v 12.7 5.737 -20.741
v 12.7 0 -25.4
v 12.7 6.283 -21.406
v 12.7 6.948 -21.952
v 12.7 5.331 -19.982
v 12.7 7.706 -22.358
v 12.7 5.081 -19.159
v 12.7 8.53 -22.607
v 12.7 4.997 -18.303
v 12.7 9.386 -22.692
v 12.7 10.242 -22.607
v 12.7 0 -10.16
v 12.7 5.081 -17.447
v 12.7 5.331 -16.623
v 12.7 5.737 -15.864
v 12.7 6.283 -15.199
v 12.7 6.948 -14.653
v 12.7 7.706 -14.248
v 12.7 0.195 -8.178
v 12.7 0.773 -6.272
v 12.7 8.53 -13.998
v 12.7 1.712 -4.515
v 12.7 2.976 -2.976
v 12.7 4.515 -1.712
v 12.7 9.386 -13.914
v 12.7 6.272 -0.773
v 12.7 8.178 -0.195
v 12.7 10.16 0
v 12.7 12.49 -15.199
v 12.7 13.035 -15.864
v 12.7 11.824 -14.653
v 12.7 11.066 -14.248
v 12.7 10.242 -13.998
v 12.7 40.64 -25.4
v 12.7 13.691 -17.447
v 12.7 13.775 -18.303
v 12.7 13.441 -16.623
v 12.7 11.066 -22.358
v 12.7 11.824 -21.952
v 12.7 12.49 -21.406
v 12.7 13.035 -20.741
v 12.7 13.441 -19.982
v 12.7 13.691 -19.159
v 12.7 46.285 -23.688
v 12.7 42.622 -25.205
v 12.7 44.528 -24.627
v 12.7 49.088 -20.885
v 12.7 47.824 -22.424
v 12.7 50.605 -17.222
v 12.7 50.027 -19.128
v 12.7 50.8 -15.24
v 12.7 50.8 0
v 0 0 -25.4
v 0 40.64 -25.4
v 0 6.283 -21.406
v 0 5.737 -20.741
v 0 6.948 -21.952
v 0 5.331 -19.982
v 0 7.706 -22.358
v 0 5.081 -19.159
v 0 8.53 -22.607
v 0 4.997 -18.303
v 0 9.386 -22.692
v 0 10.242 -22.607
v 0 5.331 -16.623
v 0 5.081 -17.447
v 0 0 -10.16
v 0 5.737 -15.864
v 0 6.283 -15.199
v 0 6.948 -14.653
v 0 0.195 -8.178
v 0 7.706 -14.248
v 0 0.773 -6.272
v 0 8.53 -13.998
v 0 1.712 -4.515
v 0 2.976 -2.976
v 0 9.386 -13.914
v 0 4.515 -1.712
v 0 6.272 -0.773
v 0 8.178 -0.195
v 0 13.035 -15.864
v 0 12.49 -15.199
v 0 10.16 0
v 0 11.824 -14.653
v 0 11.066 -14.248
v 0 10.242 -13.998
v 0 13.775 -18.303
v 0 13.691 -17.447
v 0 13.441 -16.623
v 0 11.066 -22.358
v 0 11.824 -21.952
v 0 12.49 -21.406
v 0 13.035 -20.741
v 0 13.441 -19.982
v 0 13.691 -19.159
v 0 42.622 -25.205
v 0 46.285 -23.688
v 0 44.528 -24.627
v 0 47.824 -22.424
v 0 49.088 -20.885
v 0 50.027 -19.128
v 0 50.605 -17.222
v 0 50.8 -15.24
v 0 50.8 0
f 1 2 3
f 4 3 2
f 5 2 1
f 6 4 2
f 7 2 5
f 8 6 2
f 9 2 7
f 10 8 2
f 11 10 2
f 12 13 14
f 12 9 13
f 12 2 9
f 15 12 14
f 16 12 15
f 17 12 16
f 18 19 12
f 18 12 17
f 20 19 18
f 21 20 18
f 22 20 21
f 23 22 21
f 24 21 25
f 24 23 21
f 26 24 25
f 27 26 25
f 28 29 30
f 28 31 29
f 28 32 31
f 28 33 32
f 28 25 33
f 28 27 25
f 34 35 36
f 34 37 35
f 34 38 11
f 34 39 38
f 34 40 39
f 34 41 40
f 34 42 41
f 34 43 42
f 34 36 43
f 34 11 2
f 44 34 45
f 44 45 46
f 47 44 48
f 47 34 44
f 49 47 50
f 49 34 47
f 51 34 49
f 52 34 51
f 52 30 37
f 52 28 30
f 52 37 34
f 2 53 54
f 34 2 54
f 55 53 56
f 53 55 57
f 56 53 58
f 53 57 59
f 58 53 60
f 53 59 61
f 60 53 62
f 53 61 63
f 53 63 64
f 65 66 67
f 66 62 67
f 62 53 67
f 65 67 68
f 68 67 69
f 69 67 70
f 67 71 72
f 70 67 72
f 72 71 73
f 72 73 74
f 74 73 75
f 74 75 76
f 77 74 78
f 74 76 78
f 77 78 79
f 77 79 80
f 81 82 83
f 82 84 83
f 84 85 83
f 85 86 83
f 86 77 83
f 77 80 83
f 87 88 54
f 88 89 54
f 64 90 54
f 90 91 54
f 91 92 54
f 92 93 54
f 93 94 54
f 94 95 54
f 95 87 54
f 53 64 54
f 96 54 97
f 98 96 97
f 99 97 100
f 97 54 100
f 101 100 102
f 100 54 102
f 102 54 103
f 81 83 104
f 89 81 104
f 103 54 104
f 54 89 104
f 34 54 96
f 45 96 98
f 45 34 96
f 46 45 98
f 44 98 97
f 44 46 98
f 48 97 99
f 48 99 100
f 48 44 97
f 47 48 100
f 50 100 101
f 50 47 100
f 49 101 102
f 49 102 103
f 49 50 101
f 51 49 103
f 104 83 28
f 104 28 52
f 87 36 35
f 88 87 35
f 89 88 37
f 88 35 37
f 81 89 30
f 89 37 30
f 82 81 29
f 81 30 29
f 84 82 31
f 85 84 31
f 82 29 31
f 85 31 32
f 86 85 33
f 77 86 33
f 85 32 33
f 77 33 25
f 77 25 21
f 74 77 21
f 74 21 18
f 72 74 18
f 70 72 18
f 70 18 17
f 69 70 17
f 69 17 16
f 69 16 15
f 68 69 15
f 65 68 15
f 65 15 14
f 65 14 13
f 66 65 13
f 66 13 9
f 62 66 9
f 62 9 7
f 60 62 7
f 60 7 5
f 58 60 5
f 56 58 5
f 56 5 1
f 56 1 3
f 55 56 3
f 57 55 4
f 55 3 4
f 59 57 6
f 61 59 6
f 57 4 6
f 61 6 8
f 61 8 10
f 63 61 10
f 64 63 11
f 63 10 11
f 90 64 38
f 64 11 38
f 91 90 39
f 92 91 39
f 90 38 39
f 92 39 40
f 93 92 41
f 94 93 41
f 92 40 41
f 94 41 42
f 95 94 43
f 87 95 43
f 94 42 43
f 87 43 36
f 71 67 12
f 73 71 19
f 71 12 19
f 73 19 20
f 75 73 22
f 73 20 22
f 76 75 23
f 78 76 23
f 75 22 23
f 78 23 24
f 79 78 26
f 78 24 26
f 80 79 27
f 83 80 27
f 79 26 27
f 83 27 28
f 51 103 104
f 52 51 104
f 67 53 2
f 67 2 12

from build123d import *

# Parameters (mm, degrees)
F0_W     = 50.8
F0_H     = 25.4
F1_DEPTH = 12.7
F2_R     = 10.16
F3_R     = 4.389033
F4_DEPTH = 25.4


with BuildPart() as f1:
    # F0 (on Right) → F1 (new body)
    with BuildSketch(Plane.YZ):
        with Locations((25.4, -12.7)):
            Rectangle(F0_W, F0_H)
    extrude(amount=F1_DEPTH)

    # F2
    f2_edges = [f1.edges().sort_by_distance(p)[0] for p in [
        (6.35, 0, 0),
        (6.35, 50.8, -25.4),
    ]]
    fillet(f2_edges, radius=F2_R)

    # F3 (on face) → F4 (cut)
    with BuildSketch(Plane.YZ.offset(12.7)):
        with Locations((9.386016, -18.30278)):
            Circle(F3_R)
    extrude(amount=-F4_DEPTH, mode=Mode.SUBTRACT)


solid = f1.part
